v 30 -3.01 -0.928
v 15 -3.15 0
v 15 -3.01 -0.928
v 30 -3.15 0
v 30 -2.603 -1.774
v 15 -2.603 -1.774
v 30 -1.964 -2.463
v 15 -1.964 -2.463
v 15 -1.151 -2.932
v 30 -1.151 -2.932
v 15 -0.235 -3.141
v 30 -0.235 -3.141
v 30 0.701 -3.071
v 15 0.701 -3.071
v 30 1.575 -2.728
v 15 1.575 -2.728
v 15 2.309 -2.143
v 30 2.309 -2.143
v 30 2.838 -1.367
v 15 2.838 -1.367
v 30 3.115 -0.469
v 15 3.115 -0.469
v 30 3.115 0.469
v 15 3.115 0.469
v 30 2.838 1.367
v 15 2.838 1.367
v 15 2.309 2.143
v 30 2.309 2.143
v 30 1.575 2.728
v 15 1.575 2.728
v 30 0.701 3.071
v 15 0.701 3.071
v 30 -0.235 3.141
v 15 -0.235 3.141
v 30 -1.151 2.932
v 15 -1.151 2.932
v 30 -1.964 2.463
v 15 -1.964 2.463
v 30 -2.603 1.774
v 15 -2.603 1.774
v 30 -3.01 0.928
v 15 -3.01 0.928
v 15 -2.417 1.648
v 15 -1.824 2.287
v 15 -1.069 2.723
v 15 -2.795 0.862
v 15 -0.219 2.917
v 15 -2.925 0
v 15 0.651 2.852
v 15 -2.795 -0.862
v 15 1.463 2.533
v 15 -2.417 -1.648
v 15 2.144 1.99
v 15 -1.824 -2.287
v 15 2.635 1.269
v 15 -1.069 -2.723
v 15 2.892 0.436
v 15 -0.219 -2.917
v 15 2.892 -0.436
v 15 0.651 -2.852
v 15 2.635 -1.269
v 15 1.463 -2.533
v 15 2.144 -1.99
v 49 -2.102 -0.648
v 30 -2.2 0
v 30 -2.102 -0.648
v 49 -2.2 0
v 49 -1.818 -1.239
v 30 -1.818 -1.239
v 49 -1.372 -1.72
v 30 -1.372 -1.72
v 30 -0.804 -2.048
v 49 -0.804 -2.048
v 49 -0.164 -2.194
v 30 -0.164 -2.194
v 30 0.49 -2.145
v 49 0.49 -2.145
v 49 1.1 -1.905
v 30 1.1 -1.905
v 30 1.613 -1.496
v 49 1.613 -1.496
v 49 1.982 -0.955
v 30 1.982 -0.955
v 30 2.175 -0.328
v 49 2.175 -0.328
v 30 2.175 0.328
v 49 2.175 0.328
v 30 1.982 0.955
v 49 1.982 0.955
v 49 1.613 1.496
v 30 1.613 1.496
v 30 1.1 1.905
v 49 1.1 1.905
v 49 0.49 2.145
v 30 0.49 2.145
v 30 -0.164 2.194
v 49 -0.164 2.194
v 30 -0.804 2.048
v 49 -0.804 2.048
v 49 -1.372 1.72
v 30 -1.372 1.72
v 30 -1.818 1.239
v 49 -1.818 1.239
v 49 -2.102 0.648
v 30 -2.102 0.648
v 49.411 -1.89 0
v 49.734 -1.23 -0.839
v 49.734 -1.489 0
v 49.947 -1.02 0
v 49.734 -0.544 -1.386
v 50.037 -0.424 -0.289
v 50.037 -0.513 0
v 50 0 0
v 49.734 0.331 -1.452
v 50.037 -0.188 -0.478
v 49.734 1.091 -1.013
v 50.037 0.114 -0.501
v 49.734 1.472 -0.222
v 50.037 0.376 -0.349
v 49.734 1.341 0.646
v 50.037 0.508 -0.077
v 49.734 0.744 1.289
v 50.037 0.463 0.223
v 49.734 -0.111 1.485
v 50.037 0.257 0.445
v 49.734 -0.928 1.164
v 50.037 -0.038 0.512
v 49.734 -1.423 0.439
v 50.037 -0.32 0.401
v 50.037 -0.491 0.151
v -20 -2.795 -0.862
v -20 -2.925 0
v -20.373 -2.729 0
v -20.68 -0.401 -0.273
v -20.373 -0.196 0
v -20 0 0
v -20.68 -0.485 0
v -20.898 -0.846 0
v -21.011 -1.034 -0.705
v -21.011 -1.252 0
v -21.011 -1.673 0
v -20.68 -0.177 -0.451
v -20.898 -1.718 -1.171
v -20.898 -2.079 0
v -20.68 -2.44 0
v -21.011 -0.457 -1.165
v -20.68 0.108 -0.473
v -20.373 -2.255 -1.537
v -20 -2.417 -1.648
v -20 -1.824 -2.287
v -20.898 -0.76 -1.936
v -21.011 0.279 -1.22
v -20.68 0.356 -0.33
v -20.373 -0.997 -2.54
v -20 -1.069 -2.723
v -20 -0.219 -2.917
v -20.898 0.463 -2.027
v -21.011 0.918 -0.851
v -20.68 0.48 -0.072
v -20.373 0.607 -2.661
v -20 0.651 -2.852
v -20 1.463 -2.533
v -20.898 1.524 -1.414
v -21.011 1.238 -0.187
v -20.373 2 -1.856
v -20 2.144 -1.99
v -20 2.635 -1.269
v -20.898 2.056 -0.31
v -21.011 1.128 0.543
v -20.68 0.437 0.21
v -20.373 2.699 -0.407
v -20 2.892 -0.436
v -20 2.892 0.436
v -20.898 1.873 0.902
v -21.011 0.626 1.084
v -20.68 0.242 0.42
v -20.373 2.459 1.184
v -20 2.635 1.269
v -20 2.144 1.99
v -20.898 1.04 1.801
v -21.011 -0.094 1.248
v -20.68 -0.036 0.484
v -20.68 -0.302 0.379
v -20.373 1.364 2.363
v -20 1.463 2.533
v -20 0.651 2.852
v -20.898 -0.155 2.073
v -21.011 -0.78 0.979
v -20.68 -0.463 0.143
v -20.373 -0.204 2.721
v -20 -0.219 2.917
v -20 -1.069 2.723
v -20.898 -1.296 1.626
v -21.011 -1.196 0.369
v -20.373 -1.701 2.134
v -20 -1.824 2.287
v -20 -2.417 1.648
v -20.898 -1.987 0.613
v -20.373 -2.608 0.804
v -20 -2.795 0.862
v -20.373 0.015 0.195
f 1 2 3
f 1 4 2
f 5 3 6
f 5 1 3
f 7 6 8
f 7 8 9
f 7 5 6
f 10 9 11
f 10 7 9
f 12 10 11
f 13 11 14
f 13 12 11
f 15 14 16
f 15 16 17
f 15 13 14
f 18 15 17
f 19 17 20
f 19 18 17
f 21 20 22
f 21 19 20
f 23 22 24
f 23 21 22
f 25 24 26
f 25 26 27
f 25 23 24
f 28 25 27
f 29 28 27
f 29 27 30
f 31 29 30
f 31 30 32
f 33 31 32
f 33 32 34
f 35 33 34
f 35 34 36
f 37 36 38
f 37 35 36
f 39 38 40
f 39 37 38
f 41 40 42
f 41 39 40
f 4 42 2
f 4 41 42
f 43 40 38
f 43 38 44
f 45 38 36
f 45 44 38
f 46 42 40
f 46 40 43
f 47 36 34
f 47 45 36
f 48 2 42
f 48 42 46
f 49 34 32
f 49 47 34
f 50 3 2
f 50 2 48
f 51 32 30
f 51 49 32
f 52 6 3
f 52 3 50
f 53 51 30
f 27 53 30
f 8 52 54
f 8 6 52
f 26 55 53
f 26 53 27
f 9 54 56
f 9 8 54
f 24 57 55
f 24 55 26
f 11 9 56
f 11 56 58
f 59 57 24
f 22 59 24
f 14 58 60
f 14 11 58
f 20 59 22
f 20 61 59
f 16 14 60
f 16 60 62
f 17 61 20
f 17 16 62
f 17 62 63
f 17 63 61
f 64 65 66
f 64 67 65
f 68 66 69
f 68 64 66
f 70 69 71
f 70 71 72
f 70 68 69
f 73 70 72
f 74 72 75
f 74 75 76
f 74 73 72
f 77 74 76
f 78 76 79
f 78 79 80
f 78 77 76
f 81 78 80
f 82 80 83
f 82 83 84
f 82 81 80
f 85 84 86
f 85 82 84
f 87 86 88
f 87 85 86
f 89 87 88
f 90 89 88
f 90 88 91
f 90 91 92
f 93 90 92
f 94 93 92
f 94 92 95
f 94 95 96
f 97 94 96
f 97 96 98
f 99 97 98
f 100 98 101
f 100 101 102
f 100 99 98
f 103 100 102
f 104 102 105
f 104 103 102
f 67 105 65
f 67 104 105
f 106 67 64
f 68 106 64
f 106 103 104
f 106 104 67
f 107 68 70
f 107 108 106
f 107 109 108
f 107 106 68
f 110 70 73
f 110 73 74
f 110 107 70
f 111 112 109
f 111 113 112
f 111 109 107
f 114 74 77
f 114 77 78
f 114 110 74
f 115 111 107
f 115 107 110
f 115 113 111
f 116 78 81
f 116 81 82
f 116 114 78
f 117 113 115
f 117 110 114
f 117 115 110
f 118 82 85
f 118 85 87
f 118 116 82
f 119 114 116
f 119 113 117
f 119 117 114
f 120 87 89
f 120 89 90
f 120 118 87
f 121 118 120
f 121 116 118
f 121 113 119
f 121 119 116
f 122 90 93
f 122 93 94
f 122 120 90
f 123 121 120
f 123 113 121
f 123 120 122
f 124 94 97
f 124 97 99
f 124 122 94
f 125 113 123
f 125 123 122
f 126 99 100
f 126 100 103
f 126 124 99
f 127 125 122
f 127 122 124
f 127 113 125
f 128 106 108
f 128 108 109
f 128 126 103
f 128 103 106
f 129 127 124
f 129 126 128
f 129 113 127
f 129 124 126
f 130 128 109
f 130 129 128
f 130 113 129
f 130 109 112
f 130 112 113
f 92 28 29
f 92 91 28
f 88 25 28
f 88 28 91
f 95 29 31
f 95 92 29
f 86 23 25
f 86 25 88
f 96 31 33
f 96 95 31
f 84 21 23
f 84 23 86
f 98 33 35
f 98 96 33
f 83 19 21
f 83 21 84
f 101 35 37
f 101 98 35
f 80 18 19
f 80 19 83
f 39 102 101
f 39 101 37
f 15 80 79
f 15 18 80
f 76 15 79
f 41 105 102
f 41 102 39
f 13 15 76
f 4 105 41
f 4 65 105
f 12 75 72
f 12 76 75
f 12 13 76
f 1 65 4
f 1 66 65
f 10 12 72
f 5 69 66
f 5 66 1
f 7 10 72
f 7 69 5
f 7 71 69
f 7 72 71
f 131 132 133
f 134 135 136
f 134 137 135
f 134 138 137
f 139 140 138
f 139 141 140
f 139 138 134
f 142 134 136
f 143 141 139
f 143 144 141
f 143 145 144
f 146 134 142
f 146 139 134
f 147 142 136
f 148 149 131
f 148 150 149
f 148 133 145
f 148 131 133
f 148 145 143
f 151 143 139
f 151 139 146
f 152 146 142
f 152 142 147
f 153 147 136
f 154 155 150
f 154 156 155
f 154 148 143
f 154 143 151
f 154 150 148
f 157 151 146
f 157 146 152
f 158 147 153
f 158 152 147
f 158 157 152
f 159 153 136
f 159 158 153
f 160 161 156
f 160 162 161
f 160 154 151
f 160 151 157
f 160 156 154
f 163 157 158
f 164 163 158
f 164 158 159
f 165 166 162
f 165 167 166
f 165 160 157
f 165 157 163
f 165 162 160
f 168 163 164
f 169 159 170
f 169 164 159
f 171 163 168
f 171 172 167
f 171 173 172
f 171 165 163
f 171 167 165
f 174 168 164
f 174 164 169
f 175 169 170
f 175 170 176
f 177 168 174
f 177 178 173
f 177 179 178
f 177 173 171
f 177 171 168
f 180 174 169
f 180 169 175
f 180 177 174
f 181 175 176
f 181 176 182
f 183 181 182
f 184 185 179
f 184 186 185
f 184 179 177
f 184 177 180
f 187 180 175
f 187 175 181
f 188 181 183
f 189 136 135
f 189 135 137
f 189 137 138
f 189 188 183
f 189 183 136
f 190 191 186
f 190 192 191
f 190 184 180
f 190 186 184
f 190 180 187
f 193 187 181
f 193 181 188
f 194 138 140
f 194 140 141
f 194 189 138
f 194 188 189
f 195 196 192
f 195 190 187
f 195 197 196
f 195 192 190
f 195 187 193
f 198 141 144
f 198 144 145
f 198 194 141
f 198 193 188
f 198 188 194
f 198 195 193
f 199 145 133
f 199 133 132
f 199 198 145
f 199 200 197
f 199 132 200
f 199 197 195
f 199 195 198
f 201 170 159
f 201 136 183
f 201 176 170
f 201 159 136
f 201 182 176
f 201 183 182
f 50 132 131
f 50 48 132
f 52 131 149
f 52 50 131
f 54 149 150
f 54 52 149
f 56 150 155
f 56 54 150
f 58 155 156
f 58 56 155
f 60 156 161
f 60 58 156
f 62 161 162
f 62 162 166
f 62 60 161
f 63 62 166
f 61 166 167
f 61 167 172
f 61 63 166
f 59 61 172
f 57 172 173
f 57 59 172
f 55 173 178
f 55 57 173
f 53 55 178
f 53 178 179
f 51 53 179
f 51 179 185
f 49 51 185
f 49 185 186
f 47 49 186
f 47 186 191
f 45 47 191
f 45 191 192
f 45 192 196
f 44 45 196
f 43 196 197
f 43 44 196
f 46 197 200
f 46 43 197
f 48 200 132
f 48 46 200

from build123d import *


with BuildPart() as part:
    # Sketch4 → Revolve5 (revolve)
    with BuildSketch(Plane.XY):
        with BuildLine():
            Line((50, 0), (30, 0))
            Line((30, 0), (30, -2.2))
            Line((30, -2.2), (49, -2.2))
            ThreePointArc((49, -2.2), (49.854727227, -1.261239649), (50, 0))
        make_face()
        Polygon((30, 0), (15, 0), (15, -2.925), (15, -3.15), (30, -3.15), (30, -2.2), align=None)
        with BuildLine():
            Line((15, 0), (-20, 0))
            ThreePointArc((-20, 0), (-21.025452167, -1.4625), (-20, -2.925))
            Line((-20, -2.925), (15, -2.925))
            Line((15, -2.925), (15, 0))
        make_face()
    revolve(axis=Axis((-50, 0, 0), (1, 0, 0)))


solid = part.part
